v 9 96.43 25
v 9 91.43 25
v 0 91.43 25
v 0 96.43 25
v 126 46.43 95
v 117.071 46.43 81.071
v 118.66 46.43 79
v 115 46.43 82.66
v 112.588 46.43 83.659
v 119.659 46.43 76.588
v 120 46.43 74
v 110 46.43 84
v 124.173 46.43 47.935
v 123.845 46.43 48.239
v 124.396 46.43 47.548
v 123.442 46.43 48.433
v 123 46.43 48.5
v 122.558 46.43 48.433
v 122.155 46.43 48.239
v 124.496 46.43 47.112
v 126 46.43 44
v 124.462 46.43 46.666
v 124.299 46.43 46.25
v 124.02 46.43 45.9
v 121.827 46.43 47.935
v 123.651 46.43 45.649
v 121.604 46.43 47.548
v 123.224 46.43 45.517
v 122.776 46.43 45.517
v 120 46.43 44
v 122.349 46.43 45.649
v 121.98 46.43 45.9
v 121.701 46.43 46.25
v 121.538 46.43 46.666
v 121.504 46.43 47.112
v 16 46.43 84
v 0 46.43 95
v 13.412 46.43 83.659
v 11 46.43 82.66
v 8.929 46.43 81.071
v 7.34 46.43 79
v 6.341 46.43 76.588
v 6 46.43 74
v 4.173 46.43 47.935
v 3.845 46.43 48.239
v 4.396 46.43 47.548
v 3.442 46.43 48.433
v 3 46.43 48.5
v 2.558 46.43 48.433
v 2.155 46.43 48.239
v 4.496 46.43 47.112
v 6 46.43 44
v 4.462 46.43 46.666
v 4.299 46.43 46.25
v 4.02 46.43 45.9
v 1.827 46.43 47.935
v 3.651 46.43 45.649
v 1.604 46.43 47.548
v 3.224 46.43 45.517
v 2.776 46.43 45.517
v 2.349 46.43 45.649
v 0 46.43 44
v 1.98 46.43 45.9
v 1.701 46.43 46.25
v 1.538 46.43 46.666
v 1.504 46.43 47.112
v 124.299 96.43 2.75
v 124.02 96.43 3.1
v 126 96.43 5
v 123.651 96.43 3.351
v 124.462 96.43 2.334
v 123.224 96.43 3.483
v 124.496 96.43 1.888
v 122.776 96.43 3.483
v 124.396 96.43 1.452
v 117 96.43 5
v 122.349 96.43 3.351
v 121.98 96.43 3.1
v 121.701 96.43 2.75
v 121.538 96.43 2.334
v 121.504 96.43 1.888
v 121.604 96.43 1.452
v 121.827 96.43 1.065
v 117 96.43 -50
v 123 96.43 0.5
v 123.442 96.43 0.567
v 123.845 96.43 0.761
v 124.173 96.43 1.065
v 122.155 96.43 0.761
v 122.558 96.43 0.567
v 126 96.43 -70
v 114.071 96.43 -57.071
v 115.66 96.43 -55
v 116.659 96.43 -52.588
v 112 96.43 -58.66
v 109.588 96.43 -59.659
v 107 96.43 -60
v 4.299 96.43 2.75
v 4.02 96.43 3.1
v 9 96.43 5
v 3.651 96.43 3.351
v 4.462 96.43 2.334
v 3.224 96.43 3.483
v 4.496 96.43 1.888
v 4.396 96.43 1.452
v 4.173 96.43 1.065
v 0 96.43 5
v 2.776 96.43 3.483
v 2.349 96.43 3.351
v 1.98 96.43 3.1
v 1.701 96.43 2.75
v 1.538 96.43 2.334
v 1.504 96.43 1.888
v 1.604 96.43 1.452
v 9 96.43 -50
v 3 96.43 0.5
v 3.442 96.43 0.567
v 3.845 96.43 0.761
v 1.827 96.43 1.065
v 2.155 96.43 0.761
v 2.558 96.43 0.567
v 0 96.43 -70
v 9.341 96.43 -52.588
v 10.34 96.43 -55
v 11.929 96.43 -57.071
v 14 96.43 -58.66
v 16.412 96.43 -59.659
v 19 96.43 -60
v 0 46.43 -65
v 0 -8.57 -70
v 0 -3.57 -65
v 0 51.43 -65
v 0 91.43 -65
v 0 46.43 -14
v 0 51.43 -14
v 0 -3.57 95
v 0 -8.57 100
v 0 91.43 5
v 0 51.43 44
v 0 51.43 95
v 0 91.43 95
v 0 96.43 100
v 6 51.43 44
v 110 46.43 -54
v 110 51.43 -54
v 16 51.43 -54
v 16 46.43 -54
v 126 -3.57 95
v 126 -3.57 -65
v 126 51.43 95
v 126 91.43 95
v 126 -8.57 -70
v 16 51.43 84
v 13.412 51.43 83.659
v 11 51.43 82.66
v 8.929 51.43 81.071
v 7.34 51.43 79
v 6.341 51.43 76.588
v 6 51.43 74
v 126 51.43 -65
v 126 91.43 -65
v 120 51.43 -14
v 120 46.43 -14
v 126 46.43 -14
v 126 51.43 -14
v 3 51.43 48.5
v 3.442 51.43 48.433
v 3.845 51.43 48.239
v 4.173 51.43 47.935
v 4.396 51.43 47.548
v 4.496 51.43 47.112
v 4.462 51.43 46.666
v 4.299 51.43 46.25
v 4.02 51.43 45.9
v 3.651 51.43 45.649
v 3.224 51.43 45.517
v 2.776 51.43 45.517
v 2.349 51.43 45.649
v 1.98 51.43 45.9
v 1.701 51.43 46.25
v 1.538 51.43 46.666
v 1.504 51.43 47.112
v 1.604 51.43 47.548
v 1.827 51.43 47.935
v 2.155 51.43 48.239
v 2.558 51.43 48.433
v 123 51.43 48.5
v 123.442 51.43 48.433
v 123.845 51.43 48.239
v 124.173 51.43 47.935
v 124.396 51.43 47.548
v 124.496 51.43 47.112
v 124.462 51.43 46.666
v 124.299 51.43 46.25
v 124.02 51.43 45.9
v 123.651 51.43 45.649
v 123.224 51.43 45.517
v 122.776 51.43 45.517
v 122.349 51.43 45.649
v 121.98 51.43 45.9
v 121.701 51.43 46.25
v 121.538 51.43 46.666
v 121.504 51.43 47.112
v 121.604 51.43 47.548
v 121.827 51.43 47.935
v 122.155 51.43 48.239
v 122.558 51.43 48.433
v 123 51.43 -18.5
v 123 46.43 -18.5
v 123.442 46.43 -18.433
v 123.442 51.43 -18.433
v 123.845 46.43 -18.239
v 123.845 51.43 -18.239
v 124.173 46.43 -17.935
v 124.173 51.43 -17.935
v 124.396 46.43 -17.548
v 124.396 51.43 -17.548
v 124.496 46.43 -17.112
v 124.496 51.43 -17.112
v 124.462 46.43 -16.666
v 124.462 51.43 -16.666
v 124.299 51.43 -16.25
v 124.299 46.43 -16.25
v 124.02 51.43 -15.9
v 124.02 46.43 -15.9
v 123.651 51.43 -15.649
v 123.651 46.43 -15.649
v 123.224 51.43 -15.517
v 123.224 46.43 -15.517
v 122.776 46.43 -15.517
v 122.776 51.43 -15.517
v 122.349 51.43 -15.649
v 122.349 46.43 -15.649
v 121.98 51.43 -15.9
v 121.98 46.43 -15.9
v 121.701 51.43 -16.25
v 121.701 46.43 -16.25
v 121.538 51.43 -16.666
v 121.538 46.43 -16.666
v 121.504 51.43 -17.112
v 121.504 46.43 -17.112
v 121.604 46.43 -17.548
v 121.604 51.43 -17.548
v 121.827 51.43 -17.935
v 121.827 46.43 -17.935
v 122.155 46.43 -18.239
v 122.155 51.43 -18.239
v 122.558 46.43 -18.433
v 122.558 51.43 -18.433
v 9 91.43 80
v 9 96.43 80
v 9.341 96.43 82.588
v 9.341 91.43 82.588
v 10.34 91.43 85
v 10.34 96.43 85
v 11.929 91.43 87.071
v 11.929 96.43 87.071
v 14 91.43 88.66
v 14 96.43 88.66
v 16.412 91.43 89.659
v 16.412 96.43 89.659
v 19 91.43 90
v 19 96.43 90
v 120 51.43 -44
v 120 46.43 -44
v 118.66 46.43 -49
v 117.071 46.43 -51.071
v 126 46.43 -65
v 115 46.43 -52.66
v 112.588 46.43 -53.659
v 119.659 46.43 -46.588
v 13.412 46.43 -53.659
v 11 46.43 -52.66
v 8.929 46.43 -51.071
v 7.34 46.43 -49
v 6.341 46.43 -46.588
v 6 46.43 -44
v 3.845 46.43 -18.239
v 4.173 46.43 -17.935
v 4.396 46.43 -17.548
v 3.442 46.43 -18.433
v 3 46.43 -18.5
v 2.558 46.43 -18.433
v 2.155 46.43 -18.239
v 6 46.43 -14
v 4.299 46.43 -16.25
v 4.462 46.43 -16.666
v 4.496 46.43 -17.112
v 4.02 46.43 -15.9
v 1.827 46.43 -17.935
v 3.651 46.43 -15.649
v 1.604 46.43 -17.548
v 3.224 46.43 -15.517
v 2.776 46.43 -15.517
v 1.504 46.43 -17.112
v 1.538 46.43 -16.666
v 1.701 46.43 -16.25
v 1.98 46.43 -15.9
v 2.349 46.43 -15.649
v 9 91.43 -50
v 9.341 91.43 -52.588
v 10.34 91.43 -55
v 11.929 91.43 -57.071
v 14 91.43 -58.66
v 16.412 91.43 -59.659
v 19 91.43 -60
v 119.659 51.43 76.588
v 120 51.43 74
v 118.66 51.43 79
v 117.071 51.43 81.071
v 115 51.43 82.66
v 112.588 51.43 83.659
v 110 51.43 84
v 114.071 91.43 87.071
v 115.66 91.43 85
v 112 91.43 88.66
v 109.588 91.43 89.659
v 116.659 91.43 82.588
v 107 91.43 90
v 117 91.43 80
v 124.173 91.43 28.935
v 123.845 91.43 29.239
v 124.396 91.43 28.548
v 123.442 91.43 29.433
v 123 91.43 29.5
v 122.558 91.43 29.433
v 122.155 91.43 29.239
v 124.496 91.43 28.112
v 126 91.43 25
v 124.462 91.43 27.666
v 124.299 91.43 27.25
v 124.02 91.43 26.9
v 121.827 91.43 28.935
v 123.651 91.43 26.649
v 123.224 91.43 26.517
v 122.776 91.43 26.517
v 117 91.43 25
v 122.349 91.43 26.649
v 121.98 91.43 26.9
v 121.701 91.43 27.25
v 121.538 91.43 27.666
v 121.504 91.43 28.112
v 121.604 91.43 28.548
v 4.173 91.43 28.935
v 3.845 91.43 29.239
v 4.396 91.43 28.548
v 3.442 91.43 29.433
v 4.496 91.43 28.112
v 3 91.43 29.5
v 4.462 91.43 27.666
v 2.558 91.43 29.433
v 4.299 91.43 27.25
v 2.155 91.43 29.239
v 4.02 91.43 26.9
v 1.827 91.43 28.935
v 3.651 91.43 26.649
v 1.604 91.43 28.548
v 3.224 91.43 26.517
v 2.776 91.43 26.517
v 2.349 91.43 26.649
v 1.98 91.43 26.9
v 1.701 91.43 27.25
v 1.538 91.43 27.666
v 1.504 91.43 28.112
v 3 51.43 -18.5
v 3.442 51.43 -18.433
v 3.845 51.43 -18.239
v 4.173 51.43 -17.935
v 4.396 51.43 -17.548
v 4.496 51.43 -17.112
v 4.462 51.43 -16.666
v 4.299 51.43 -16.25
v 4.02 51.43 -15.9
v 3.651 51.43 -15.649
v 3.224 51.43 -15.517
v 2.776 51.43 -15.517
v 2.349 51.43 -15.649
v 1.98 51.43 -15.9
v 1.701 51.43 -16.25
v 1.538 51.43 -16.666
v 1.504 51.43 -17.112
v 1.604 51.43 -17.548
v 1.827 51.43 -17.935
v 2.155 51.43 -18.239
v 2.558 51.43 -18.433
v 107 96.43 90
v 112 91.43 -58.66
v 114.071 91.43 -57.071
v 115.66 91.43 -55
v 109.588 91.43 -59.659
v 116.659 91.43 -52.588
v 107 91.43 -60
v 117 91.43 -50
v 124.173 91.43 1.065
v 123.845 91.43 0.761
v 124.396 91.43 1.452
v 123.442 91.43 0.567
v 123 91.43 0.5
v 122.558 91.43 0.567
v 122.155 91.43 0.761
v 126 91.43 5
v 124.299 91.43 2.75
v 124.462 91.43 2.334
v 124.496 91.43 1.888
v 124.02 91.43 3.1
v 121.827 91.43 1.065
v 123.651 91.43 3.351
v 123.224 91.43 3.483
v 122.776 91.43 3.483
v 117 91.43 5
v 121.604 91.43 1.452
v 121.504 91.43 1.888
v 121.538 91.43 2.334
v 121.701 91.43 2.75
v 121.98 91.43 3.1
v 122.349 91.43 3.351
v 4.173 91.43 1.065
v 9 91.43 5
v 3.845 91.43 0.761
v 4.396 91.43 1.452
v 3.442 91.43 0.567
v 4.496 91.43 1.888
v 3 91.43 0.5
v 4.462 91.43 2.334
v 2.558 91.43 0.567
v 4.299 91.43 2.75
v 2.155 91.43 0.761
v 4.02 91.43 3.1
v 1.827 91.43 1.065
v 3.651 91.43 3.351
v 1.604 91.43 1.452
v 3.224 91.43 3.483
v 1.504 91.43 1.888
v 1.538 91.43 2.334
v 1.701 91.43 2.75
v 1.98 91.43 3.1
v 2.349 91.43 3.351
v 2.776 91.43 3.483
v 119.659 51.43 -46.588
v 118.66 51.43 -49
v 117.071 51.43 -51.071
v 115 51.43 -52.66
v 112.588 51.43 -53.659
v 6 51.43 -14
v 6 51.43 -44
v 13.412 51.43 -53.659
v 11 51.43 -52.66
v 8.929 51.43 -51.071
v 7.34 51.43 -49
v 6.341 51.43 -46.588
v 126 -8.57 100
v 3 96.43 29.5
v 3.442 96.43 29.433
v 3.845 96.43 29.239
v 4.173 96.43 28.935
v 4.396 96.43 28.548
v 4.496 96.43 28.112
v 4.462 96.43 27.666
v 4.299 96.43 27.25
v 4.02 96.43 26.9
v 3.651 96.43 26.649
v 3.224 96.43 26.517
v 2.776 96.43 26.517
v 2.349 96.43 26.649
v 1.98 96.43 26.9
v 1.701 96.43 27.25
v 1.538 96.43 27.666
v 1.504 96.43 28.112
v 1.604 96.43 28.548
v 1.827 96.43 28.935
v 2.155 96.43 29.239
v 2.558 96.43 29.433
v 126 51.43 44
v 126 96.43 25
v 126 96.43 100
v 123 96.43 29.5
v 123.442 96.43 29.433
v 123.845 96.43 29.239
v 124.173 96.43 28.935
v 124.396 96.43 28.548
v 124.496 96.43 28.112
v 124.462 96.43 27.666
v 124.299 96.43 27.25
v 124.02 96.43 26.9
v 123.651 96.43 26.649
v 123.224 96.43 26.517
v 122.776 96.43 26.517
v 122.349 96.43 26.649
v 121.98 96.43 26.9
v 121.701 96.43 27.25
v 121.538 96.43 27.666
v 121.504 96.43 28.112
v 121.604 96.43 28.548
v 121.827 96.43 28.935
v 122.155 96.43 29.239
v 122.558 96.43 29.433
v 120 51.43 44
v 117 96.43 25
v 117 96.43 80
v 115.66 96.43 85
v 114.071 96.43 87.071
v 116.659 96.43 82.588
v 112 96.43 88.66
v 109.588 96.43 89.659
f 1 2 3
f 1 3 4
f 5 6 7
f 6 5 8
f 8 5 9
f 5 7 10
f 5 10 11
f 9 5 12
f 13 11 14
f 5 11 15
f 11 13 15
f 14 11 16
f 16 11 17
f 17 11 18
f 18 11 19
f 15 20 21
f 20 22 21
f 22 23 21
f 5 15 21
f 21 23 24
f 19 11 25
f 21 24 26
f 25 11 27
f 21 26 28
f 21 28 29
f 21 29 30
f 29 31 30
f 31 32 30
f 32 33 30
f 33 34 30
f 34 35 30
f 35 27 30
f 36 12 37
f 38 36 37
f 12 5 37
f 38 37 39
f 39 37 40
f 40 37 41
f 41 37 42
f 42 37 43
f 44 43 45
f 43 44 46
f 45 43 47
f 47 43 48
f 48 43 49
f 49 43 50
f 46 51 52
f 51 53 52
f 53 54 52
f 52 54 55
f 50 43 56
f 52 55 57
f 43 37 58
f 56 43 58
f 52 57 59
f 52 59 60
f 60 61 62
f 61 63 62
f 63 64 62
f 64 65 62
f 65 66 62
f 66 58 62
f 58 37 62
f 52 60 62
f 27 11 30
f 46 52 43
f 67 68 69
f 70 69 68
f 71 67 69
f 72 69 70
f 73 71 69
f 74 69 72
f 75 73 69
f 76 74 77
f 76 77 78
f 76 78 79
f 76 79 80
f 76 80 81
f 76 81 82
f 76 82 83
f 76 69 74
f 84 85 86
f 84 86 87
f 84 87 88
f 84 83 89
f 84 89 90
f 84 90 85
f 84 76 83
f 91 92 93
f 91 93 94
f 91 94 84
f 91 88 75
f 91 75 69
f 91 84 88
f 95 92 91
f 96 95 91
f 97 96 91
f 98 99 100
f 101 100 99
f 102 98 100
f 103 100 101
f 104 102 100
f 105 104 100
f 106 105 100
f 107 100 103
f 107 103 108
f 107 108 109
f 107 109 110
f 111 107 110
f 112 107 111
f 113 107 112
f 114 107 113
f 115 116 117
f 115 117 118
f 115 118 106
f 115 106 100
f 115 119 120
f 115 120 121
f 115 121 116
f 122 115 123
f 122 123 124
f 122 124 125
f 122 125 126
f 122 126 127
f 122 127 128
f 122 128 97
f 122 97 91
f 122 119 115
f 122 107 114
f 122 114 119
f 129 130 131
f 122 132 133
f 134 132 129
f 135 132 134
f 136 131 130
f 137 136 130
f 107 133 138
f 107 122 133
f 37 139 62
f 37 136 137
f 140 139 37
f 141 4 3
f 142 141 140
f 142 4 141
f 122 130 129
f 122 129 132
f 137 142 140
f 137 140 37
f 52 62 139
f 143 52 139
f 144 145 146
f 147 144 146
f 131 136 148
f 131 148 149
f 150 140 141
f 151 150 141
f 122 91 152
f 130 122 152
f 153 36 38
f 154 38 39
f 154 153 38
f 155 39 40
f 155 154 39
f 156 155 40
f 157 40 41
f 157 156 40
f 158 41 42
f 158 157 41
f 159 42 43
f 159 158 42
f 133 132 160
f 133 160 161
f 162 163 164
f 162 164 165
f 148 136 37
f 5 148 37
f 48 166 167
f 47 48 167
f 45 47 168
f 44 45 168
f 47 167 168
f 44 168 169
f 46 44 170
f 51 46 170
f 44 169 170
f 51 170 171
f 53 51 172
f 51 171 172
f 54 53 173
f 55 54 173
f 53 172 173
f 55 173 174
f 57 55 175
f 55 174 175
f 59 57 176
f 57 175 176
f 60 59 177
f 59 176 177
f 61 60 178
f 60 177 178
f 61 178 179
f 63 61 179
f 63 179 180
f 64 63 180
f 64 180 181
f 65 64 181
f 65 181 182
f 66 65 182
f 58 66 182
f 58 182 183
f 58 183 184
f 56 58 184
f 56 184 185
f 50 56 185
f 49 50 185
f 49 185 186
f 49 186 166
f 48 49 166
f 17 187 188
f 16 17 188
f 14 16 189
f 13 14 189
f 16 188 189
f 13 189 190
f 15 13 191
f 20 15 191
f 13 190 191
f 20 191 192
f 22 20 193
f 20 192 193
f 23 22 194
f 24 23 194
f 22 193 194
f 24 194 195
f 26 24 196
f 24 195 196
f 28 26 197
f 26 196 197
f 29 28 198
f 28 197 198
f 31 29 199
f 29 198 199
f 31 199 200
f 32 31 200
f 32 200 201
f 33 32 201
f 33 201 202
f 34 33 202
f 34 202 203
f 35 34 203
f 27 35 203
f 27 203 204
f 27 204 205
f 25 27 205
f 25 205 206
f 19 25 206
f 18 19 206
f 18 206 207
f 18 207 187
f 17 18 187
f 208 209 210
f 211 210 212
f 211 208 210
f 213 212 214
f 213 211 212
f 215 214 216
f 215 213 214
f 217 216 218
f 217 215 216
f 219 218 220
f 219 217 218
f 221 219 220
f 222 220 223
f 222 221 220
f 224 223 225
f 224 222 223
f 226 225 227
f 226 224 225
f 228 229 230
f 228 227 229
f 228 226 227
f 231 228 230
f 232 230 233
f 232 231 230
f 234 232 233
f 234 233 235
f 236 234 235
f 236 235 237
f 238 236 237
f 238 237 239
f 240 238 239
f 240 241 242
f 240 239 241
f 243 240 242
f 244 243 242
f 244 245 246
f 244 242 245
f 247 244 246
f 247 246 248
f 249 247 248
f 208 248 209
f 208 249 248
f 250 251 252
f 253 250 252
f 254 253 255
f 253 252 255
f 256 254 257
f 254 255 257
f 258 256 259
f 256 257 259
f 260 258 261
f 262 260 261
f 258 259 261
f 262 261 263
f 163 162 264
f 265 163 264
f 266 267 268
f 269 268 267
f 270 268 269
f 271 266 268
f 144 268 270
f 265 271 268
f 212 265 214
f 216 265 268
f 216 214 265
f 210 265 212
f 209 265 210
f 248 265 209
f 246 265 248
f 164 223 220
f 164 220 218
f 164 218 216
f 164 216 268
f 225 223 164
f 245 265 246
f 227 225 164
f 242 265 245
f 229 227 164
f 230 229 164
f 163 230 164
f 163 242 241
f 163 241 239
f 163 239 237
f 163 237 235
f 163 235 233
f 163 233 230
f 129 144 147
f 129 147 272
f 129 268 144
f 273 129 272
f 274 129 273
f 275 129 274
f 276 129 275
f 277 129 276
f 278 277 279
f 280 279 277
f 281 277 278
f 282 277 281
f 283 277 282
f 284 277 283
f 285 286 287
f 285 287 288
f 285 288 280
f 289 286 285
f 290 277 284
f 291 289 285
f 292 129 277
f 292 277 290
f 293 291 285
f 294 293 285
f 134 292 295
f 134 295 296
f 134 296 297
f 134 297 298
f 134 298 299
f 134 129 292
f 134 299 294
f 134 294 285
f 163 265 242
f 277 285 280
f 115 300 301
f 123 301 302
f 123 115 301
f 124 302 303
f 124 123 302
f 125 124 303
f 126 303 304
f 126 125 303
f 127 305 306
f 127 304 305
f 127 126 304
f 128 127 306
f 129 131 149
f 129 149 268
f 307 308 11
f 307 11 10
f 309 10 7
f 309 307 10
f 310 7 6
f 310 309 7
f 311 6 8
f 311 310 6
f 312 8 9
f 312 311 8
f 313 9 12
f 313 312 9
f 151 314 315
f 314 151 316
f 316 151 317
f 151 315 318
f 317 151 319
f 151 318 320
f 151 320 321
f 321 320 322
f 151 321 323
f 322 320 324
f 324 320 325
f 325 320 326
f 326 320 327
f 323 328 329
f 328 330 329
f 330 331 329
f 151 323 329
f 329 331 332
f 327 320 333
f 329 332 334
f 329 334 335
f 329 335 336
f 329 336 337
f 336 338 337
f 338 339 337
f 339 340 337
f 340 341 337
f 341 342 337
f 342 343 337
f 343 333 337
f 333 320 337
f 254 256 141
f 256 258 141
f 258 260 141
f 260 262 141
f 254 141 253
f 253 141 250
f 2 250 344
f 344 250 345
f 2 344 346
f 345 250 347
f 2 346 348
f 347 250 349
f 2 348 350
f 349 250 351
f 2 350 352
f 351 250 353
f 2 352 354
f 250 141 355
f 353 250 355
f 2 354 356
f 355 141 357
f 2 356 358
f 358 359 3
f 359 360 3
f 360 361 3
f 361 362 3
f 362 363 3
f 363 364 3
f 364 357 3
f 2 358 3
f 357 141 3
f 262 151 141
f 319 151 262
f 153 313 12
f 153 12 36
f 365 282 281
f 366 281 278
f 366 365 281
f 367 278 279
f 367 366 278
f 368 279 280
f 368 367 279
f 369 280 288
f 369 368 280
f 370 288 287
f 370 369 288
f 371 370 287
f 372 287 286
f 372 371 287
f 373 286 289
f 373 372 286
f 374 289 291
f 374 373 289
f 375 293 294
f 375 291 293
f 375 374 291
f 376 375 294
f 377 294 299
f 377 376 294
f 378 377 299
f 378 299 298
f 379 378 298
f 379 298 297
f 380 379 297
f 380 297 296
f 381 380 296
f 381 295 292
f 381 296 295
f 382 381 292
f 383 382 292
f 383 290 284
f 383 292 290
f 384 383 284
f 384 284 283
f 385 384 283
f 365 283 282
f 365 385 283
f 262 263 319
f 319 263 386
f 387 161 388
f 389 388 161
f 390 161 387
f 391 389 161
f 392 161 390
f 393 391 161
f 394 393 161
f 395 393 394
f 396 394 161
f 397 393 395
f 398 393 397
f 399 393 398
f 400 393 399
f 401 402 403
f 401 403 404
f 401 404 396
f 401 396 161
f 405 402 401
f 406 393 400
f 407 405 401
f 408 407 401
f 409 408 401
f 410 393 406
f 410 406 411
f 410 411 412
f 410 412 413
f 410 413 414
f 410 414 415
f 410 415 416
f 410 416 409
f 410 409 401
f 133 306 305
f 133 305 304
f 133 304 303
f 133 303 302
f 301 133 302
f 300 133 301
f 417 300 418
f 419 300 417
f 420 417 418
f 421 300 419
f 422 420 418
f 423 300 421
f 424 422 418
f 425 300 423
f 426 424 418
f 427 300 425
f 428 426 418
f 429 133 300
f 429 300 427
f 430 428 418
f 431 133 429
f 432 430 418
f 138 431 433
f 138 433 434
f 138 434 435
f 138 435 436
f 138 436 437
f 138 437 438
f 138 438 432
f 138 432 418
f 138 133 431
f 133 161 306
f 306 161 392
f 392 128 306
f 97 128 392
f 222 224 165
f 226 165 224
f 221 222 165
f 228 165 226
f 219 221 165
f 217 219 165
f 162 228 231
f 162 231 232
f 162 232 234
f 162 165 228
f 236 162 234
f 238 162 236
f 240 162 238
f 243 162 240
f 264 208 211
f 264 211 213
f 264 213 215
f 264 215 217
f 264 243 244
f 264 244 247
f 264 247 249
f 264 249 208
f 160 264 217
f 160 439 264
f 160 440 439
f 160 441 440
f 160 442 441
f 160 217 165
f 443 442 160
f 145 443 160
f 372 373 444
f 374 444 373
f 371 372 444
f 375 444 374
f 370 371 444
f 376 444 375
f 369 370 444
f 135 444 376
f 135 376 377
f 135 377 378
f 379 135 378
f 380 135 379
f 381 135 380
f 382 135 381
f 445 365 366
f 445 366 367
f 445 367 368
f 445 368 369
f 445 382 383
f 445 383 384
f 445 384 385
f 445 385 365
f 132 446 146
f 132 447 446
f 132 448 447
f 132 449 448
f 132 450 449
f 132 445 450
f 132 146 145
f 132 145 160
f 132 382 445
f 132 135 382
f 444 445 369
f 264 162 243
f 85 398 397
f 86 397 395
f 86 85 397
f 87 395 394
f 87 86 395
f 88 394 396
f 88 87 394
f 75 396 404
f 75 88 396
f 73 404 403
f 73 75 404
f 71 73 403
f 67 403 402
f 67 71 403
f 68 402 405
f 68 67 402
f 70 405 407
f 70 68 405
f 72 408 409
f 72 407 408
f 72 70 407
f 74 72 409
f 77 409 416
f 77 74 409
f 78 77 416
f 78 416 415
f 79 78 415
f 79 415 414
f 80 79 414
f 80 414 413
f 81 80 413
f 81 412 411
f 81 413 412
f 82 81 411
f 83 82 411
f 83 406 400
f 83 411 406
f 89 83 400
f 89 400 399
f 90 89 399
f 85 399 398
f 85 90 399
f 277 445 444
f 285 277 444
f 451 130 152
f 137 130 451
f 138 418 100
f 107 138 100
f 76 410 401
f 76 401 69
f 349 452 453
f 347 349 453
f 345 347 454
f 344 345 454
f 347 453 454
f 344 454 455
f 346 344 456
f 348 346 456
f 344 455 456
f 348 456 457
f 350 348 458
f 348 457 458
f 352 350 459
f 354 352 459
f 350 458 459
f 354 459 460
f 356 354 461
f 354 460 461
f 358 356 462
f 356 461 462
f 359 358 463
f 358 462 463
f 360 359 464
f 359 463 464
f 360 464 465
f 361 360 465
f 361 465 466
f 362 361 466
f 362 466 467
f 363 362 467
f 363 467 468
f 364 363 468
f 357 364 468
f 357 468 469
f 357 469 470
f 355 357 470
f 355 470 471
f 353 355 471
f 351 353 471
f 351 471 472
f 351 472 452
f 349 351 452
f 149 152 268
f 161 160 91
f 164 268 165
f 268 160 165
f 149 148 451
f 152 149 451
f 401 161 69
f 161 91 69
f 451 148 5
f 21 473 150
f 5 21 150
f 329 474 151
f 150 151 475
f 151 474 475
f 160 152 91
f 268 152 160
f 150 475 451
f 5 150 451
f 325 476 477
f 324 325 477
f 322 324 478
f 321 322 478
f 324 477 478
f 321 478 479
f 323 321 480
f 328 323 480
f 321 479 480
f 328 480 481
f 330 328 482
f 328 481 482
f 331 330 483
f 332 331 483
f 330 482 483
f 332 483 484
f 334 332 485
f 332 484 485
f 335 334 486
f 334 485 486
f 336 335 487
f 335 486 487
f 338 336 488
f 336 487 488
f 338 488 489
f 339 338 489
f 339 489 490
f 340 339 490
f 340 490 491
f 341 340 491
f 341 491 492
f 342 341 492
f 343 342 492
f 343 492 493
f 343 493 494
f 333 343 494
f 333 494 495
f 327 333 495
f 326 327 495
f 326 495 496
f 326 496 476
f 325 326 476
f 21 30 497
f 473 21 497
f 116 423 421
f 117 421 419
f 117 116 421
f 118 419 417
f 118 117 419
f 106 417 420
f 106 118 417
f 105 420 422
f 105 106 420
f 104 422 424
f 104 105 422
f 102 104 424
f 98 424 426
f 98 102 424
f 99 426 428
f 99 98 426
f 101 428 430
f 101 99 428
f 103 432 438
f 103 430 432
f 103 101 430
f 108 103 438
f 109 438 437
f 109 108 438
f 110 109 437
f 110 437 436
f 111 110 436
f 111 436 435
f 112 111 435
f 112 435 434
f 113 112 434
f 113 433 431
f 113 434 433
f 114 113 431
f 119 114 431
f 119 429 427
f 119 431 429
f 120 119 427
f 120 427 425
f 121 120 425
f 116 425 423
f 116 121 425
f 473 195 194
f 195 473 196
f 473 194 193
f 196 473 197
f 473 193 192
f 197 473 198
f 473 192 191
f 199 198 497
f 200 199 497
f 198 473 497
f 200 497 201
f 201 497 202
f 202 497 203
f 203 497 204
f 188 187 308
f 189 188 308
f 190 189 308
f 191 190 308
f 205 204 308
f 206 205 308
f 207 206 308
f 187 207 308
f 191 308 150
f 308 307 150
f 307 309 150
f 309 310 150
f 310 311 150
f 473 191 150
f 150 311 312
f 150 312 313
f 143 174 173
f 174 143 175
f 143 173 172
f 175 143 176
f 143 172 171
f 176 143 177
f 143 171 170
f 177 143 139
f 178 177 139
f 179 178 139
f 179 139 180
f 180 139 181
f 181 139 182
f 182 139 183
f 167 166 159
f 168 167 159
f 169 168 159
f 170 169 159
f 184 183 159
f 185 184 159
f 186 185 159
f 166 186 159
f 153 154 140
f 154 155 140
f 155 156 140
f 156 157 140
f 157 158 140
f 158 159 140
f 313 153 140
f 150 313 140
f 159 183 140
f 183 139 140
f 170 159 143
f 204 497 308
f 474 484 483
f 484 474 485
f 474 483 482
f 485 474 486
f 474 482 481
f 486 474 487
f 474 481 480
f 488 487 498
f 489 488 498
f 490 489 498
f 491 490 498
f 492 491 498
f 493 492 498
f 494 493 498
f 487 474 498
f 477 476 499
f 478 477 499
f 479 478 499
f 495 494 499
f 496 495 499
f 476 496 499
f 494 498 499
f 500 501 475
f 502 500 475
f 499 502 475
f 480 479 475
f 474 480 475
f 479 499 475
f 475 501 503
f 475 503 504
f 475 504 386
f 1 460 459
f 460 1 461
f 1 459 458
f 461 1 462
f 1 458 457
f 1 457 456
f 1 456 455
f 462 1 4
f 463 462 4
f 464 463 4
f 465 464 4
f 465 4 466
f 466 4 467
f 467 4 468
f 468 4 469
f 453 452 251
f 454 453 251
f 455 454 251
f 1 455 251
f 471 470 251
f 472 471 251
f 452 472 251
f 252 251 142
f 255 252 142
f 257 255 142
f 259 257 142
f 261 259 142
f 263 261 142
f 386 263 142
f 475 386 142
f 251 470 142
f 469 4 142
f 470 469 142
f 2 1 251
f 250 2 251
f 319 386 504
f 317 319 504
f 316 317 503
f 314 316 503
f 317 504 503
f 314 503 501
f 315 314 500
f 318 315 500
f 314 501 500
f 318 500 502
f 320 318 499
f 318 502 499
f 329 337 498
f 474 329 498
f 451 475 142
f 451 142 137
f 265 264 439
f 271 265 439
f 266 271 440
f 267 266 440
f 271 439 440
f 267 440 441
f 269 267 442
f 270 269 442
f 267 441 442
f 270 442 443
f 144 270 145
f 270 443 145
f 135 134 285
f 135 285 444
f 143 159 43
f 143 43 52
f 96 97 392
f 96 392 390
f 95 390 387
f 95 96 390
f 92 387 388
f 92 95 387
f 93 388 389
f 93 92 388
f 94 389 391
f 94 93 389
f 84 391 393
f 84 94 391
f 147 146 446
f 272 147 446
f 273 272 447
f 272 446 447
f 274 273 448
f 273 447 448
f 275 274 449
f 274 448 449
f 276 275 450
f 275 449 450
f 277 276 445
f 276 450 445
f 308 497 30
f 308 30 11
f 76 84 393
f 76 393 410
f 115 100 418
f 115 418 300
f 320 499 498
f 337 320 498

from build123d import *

# Parameters (mm, degrees)
BOSS_EXTRUDE1_DEPTH = 126
SKETCH2_R           = 1.5
CUT_EXTRUDE1_DEPTH  = 45
SKETCH3_R           = 1.5
CUT_EXTRUDE3_DEPTH  = 55
CUT_EXTRUDE6_DEPTH  = 45


with BuildPart() as part:
    # Sketch1 → Boss-Extrude1 (new body)
    with BuildSketch(Plane(origin=(0, 0, 0), x_dir=(0, 0, -1), z_dir=(1, 0, 0))):
        Polygon((-95, -3.570472346), (-95, 46.429527654), (-44, 46.429527654), (-44, 51.429527654), (-95, 51.429527654), (-95, 91.429527654), (-25, 91.429527654), (-25, 96.429527654), (-90, 96.429527654), (-100, 96.429527654), (-100, 86.429527654), (-100, -8.570472346), (-90, -8.570472346), (-15, -8.570472346), (-15, -3.570472346), align=None)
    boss_extrude1 = extrude(amount=BOSS_EXTRUDE1_DEPTH)

    # Sketch2 → Cut-Extrude1 (cut)
    with BuildSketch(Plane(origin=(0, 96.429527654, 0), x_dir=(1, 0, 0), z_dir=(0, 1, 0))):
        with Locations(Location((3, -28, 0), (0, 0, 270))):
            Circle(SKETCH2_R)
        with Locations(Location((123, -28, 0), (0, 0, 270))):
            Circle(SKETCH2_R)
    cut_extrude1 = extrude(amount=-CUT_EXTRUDE1_DEPTH, mode=Mode.SUBTRACT)

    # Sketch3 → Cut-Extrude3 (cut)
    with BuildSketch(Plane(origin=(0, 51.429527654, 0), x_dir=(1, 0, 0), z_dir=(0, 1, 0))):
        with Locations(Location((3, -47, 0), (0, 0, 270))):
            Circle(SKETCH3_R)
        with Locations(Location((123, -47, 0), (0, 0, 270))):
            Circle(SKETCH3_R)
        with BuildLine():
            Line((6, -74), (6, -44))
            Line((6, -44), (120, -44))
            Line((120, -44), (120, -74))
            ThreePointArc((120, -74), (117.071067812, -81.071067812), (110, -84))
            Line((110, -84), (16, -84))
            ThreePointArc((16, -84), (8.928932188, -81.071067812), (6, -74))
        make_face()
    cut_extrude3 = extrude(amount=-CUT_EXTRUDE3_DEPTH, mode=Mode.SUBTRACT)

    # Mirror2: Boss-Extrude1, Cut-Extrude1, Cut-Extrude3 across plane
    add(boss_extrude1.mirror(Plane(origin=(0, 0, 15), x_dir=(1, 0, 0), z_dir=(0, 0, -1))))
    add(cut_extrude1.mirror(Plane(origin=(0, 0, 15), x_dir=(1, 0, 0), z_dir=(0, 0, -1))), mode=Mode.SUBTRACT)
    add(cut_extrude3.mirror(Plane(origin=(0, 0, 15), x_dir=(1, 0, 0), z_dir=(0, 0, -1))), mode=Mode.SUBTRACT)

    # Sketch4 → Cut-Extrude6 (cut)
    with BuildSketch(Plane(origin=(0, 96.429527654, 0), x_dir=(1, 0, 0), z_dir=(0, 1, 0))):
        with BuildLine():
            Line((9, -25), (9, -80))
            ThreePointArc((9, -80), (11.928932188, -87.071067812), (19, -90))
            Line((19, -90), (107, -90))
            ThreePointArc((107, -90), (114.071067812, -87.071067812), (117, -80))
            Line((117, -80), (117, -25))
            Line((117, -25), (9, -25))
        make_face()
    cut_extrude6 = extrude(amount=-CUT_EXTRUDE6_DEPTH, mode=Mode.SUBTRACT)

    # Mirror5: Cut-Extrude6 across plane
    add(cut_extrude6.mirror(Plane(origin=(0, 0, 15), x_dir=(1, 0, 0), z_dir=(0, 0, -1))), mode=Mode.SUBTRACT)


solid = part.part
